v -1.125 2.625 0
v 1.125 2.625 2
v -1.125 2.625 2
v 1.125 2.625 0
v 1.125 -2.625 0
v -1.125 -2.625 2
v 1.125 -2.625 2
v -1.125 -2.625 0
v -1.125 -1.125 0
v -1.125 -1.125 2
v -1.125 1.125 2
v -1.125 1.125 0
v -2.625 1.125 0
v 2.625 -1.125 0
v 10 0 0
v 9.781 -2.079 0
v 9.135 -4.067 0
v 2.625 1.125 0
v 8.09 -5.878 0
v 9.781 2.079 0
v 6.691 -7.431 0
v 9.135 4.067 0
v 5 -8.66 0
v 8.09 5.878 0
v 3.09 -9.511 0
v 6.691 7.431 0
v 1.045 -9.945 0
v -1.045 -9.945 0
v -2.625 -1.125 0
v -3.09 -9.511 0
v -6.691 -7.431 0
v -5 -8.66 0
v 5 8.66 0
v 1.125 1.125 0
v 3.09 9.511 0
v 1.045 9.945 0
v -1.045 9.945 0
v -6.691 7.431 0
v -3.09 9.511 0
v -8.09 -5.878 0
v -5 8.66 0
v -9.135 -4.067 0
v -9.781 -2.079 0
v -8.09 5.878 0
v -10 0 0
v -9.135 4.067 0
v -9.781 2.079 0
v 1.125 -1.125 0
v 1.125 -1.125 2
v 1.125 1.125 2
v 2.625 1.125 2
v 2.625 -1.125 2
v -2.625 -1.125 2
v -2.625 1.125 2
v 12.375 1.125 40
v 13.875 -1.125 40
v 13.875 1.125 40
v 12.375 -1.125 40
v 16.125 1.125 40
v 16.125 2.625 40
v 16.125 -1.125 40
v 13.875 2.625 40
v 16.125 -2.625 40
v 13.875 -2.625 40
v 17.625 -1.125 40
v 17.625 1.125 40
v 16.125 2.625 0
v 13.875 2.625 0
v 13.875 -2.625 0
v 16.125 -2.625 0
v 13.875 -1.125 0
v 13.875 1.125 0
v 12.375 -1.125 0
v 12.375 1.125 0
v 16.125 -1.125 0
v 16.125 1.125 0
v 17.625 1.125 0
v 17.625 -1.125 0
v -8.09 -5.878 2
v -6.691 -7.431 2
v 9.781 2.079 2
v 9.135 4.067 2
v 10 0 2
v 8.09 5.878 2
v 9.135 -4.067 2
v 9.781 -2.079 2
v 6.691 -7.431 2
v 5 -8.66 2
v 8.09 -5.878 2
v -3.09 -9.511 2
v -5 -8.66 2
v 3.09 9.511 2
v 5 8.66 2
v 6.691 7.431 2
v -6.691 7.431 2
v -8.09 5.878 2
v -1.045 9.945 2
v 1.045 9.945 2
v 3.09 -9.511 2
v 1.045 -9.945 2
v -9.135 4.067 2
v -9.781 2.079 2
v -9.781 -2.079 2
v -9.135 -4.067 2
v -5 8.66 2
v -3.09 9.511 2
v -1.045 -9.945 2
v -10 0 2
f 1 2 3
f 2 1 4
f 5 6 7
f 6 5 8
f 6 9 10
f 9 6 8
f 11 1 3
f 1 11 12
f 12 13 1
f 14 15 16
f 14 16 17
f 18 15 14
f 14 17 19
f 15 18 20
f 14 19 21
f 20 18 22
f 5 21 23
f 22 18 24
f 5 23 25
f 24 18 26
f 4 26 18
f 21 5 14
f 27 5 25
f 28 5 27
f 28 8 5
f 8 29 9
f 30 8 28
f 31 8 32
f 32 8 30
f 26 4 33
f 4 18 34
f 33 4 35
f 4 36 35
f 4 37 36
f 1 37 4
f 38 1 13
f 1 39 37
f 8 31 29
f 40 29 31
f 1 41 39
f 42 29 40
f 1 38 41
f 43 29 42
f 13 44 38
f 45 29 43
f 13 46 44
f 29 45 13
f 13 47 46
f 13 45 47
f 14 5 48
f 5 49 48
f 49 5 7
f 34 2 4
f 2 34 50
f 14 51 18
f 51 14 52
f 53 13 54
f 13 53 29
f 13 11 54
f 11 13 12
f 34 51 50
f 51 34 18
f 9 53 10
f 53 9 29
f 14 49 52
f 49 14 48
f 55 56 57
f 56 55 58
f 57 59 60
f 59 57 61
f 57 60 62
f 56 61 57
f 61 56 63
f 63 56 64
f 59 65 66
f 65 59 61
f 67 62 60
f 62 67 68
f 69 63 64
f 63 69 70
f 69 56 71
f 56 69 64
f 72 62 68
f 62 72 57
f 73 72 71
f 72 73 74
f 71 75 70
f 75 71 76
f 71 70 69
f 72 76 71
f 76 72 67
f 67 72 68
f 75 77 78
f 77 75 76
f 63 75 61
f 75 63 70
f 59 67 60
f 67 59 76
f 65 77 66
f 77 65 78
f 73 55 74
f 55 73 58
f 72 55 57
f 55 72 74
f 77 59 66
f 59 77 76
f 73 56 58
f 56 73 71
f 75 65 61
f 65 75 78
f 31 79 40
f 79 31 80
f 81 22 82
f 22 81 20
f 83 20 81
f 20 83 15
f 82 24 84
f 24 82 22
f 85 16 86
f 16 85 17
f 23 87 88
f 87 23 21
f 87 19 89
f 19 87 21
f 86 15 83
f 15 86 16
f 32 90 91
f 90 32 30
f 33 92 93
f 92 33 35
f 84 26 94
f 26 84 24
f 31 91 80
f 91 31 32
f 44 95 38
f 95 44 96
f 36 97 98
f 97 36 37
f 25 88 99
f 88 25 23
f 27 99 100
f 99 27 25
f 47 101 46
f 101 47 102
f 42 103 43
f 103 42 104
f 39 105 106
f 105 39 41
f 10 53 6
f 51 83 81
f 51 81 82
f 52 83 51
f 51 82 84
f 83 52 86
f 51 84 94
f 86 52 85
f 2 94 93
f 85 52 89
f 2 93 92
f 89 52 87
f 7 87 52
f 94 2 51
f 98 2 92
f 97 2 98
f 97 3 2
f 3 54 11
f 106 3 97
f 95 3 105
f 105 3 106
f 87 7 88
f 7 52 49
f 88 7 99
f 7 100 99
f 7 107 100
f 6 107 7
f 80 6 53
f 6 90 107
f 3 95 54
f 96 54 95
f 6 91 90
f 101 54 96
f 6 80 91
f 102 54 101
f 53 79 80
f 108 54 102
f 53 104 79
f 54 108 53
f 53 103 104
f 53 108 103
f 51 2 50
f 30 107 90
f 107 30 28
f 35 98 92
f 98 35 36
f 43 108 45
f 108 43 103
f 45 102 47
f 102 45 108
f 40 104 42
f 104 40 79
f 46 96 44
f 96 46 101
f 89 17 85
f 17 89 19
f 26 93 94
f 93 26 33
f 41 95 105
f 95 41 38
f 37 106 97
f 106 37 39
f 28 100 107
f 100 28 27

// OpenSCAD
// A basic LEGO-compatible axle
// not endorsed by LEGO blah blah blah copyright

// Note: Axle size is approximate and primarilly intended for creating sockets

module axle(length)
{
    translate([0, 0, length / 2])
    {
        rotate([0, 0, 90])
        cube([5.25, 2.25, length], center = true);
        cube([5.25, 2.25, length], center = true);
    }
}

// Example axle
translate([15, 0, 0])
axle(40);

// Example socket
difference()
{
    cylinder(r = 10, h = 2);
    axle(40);
}
